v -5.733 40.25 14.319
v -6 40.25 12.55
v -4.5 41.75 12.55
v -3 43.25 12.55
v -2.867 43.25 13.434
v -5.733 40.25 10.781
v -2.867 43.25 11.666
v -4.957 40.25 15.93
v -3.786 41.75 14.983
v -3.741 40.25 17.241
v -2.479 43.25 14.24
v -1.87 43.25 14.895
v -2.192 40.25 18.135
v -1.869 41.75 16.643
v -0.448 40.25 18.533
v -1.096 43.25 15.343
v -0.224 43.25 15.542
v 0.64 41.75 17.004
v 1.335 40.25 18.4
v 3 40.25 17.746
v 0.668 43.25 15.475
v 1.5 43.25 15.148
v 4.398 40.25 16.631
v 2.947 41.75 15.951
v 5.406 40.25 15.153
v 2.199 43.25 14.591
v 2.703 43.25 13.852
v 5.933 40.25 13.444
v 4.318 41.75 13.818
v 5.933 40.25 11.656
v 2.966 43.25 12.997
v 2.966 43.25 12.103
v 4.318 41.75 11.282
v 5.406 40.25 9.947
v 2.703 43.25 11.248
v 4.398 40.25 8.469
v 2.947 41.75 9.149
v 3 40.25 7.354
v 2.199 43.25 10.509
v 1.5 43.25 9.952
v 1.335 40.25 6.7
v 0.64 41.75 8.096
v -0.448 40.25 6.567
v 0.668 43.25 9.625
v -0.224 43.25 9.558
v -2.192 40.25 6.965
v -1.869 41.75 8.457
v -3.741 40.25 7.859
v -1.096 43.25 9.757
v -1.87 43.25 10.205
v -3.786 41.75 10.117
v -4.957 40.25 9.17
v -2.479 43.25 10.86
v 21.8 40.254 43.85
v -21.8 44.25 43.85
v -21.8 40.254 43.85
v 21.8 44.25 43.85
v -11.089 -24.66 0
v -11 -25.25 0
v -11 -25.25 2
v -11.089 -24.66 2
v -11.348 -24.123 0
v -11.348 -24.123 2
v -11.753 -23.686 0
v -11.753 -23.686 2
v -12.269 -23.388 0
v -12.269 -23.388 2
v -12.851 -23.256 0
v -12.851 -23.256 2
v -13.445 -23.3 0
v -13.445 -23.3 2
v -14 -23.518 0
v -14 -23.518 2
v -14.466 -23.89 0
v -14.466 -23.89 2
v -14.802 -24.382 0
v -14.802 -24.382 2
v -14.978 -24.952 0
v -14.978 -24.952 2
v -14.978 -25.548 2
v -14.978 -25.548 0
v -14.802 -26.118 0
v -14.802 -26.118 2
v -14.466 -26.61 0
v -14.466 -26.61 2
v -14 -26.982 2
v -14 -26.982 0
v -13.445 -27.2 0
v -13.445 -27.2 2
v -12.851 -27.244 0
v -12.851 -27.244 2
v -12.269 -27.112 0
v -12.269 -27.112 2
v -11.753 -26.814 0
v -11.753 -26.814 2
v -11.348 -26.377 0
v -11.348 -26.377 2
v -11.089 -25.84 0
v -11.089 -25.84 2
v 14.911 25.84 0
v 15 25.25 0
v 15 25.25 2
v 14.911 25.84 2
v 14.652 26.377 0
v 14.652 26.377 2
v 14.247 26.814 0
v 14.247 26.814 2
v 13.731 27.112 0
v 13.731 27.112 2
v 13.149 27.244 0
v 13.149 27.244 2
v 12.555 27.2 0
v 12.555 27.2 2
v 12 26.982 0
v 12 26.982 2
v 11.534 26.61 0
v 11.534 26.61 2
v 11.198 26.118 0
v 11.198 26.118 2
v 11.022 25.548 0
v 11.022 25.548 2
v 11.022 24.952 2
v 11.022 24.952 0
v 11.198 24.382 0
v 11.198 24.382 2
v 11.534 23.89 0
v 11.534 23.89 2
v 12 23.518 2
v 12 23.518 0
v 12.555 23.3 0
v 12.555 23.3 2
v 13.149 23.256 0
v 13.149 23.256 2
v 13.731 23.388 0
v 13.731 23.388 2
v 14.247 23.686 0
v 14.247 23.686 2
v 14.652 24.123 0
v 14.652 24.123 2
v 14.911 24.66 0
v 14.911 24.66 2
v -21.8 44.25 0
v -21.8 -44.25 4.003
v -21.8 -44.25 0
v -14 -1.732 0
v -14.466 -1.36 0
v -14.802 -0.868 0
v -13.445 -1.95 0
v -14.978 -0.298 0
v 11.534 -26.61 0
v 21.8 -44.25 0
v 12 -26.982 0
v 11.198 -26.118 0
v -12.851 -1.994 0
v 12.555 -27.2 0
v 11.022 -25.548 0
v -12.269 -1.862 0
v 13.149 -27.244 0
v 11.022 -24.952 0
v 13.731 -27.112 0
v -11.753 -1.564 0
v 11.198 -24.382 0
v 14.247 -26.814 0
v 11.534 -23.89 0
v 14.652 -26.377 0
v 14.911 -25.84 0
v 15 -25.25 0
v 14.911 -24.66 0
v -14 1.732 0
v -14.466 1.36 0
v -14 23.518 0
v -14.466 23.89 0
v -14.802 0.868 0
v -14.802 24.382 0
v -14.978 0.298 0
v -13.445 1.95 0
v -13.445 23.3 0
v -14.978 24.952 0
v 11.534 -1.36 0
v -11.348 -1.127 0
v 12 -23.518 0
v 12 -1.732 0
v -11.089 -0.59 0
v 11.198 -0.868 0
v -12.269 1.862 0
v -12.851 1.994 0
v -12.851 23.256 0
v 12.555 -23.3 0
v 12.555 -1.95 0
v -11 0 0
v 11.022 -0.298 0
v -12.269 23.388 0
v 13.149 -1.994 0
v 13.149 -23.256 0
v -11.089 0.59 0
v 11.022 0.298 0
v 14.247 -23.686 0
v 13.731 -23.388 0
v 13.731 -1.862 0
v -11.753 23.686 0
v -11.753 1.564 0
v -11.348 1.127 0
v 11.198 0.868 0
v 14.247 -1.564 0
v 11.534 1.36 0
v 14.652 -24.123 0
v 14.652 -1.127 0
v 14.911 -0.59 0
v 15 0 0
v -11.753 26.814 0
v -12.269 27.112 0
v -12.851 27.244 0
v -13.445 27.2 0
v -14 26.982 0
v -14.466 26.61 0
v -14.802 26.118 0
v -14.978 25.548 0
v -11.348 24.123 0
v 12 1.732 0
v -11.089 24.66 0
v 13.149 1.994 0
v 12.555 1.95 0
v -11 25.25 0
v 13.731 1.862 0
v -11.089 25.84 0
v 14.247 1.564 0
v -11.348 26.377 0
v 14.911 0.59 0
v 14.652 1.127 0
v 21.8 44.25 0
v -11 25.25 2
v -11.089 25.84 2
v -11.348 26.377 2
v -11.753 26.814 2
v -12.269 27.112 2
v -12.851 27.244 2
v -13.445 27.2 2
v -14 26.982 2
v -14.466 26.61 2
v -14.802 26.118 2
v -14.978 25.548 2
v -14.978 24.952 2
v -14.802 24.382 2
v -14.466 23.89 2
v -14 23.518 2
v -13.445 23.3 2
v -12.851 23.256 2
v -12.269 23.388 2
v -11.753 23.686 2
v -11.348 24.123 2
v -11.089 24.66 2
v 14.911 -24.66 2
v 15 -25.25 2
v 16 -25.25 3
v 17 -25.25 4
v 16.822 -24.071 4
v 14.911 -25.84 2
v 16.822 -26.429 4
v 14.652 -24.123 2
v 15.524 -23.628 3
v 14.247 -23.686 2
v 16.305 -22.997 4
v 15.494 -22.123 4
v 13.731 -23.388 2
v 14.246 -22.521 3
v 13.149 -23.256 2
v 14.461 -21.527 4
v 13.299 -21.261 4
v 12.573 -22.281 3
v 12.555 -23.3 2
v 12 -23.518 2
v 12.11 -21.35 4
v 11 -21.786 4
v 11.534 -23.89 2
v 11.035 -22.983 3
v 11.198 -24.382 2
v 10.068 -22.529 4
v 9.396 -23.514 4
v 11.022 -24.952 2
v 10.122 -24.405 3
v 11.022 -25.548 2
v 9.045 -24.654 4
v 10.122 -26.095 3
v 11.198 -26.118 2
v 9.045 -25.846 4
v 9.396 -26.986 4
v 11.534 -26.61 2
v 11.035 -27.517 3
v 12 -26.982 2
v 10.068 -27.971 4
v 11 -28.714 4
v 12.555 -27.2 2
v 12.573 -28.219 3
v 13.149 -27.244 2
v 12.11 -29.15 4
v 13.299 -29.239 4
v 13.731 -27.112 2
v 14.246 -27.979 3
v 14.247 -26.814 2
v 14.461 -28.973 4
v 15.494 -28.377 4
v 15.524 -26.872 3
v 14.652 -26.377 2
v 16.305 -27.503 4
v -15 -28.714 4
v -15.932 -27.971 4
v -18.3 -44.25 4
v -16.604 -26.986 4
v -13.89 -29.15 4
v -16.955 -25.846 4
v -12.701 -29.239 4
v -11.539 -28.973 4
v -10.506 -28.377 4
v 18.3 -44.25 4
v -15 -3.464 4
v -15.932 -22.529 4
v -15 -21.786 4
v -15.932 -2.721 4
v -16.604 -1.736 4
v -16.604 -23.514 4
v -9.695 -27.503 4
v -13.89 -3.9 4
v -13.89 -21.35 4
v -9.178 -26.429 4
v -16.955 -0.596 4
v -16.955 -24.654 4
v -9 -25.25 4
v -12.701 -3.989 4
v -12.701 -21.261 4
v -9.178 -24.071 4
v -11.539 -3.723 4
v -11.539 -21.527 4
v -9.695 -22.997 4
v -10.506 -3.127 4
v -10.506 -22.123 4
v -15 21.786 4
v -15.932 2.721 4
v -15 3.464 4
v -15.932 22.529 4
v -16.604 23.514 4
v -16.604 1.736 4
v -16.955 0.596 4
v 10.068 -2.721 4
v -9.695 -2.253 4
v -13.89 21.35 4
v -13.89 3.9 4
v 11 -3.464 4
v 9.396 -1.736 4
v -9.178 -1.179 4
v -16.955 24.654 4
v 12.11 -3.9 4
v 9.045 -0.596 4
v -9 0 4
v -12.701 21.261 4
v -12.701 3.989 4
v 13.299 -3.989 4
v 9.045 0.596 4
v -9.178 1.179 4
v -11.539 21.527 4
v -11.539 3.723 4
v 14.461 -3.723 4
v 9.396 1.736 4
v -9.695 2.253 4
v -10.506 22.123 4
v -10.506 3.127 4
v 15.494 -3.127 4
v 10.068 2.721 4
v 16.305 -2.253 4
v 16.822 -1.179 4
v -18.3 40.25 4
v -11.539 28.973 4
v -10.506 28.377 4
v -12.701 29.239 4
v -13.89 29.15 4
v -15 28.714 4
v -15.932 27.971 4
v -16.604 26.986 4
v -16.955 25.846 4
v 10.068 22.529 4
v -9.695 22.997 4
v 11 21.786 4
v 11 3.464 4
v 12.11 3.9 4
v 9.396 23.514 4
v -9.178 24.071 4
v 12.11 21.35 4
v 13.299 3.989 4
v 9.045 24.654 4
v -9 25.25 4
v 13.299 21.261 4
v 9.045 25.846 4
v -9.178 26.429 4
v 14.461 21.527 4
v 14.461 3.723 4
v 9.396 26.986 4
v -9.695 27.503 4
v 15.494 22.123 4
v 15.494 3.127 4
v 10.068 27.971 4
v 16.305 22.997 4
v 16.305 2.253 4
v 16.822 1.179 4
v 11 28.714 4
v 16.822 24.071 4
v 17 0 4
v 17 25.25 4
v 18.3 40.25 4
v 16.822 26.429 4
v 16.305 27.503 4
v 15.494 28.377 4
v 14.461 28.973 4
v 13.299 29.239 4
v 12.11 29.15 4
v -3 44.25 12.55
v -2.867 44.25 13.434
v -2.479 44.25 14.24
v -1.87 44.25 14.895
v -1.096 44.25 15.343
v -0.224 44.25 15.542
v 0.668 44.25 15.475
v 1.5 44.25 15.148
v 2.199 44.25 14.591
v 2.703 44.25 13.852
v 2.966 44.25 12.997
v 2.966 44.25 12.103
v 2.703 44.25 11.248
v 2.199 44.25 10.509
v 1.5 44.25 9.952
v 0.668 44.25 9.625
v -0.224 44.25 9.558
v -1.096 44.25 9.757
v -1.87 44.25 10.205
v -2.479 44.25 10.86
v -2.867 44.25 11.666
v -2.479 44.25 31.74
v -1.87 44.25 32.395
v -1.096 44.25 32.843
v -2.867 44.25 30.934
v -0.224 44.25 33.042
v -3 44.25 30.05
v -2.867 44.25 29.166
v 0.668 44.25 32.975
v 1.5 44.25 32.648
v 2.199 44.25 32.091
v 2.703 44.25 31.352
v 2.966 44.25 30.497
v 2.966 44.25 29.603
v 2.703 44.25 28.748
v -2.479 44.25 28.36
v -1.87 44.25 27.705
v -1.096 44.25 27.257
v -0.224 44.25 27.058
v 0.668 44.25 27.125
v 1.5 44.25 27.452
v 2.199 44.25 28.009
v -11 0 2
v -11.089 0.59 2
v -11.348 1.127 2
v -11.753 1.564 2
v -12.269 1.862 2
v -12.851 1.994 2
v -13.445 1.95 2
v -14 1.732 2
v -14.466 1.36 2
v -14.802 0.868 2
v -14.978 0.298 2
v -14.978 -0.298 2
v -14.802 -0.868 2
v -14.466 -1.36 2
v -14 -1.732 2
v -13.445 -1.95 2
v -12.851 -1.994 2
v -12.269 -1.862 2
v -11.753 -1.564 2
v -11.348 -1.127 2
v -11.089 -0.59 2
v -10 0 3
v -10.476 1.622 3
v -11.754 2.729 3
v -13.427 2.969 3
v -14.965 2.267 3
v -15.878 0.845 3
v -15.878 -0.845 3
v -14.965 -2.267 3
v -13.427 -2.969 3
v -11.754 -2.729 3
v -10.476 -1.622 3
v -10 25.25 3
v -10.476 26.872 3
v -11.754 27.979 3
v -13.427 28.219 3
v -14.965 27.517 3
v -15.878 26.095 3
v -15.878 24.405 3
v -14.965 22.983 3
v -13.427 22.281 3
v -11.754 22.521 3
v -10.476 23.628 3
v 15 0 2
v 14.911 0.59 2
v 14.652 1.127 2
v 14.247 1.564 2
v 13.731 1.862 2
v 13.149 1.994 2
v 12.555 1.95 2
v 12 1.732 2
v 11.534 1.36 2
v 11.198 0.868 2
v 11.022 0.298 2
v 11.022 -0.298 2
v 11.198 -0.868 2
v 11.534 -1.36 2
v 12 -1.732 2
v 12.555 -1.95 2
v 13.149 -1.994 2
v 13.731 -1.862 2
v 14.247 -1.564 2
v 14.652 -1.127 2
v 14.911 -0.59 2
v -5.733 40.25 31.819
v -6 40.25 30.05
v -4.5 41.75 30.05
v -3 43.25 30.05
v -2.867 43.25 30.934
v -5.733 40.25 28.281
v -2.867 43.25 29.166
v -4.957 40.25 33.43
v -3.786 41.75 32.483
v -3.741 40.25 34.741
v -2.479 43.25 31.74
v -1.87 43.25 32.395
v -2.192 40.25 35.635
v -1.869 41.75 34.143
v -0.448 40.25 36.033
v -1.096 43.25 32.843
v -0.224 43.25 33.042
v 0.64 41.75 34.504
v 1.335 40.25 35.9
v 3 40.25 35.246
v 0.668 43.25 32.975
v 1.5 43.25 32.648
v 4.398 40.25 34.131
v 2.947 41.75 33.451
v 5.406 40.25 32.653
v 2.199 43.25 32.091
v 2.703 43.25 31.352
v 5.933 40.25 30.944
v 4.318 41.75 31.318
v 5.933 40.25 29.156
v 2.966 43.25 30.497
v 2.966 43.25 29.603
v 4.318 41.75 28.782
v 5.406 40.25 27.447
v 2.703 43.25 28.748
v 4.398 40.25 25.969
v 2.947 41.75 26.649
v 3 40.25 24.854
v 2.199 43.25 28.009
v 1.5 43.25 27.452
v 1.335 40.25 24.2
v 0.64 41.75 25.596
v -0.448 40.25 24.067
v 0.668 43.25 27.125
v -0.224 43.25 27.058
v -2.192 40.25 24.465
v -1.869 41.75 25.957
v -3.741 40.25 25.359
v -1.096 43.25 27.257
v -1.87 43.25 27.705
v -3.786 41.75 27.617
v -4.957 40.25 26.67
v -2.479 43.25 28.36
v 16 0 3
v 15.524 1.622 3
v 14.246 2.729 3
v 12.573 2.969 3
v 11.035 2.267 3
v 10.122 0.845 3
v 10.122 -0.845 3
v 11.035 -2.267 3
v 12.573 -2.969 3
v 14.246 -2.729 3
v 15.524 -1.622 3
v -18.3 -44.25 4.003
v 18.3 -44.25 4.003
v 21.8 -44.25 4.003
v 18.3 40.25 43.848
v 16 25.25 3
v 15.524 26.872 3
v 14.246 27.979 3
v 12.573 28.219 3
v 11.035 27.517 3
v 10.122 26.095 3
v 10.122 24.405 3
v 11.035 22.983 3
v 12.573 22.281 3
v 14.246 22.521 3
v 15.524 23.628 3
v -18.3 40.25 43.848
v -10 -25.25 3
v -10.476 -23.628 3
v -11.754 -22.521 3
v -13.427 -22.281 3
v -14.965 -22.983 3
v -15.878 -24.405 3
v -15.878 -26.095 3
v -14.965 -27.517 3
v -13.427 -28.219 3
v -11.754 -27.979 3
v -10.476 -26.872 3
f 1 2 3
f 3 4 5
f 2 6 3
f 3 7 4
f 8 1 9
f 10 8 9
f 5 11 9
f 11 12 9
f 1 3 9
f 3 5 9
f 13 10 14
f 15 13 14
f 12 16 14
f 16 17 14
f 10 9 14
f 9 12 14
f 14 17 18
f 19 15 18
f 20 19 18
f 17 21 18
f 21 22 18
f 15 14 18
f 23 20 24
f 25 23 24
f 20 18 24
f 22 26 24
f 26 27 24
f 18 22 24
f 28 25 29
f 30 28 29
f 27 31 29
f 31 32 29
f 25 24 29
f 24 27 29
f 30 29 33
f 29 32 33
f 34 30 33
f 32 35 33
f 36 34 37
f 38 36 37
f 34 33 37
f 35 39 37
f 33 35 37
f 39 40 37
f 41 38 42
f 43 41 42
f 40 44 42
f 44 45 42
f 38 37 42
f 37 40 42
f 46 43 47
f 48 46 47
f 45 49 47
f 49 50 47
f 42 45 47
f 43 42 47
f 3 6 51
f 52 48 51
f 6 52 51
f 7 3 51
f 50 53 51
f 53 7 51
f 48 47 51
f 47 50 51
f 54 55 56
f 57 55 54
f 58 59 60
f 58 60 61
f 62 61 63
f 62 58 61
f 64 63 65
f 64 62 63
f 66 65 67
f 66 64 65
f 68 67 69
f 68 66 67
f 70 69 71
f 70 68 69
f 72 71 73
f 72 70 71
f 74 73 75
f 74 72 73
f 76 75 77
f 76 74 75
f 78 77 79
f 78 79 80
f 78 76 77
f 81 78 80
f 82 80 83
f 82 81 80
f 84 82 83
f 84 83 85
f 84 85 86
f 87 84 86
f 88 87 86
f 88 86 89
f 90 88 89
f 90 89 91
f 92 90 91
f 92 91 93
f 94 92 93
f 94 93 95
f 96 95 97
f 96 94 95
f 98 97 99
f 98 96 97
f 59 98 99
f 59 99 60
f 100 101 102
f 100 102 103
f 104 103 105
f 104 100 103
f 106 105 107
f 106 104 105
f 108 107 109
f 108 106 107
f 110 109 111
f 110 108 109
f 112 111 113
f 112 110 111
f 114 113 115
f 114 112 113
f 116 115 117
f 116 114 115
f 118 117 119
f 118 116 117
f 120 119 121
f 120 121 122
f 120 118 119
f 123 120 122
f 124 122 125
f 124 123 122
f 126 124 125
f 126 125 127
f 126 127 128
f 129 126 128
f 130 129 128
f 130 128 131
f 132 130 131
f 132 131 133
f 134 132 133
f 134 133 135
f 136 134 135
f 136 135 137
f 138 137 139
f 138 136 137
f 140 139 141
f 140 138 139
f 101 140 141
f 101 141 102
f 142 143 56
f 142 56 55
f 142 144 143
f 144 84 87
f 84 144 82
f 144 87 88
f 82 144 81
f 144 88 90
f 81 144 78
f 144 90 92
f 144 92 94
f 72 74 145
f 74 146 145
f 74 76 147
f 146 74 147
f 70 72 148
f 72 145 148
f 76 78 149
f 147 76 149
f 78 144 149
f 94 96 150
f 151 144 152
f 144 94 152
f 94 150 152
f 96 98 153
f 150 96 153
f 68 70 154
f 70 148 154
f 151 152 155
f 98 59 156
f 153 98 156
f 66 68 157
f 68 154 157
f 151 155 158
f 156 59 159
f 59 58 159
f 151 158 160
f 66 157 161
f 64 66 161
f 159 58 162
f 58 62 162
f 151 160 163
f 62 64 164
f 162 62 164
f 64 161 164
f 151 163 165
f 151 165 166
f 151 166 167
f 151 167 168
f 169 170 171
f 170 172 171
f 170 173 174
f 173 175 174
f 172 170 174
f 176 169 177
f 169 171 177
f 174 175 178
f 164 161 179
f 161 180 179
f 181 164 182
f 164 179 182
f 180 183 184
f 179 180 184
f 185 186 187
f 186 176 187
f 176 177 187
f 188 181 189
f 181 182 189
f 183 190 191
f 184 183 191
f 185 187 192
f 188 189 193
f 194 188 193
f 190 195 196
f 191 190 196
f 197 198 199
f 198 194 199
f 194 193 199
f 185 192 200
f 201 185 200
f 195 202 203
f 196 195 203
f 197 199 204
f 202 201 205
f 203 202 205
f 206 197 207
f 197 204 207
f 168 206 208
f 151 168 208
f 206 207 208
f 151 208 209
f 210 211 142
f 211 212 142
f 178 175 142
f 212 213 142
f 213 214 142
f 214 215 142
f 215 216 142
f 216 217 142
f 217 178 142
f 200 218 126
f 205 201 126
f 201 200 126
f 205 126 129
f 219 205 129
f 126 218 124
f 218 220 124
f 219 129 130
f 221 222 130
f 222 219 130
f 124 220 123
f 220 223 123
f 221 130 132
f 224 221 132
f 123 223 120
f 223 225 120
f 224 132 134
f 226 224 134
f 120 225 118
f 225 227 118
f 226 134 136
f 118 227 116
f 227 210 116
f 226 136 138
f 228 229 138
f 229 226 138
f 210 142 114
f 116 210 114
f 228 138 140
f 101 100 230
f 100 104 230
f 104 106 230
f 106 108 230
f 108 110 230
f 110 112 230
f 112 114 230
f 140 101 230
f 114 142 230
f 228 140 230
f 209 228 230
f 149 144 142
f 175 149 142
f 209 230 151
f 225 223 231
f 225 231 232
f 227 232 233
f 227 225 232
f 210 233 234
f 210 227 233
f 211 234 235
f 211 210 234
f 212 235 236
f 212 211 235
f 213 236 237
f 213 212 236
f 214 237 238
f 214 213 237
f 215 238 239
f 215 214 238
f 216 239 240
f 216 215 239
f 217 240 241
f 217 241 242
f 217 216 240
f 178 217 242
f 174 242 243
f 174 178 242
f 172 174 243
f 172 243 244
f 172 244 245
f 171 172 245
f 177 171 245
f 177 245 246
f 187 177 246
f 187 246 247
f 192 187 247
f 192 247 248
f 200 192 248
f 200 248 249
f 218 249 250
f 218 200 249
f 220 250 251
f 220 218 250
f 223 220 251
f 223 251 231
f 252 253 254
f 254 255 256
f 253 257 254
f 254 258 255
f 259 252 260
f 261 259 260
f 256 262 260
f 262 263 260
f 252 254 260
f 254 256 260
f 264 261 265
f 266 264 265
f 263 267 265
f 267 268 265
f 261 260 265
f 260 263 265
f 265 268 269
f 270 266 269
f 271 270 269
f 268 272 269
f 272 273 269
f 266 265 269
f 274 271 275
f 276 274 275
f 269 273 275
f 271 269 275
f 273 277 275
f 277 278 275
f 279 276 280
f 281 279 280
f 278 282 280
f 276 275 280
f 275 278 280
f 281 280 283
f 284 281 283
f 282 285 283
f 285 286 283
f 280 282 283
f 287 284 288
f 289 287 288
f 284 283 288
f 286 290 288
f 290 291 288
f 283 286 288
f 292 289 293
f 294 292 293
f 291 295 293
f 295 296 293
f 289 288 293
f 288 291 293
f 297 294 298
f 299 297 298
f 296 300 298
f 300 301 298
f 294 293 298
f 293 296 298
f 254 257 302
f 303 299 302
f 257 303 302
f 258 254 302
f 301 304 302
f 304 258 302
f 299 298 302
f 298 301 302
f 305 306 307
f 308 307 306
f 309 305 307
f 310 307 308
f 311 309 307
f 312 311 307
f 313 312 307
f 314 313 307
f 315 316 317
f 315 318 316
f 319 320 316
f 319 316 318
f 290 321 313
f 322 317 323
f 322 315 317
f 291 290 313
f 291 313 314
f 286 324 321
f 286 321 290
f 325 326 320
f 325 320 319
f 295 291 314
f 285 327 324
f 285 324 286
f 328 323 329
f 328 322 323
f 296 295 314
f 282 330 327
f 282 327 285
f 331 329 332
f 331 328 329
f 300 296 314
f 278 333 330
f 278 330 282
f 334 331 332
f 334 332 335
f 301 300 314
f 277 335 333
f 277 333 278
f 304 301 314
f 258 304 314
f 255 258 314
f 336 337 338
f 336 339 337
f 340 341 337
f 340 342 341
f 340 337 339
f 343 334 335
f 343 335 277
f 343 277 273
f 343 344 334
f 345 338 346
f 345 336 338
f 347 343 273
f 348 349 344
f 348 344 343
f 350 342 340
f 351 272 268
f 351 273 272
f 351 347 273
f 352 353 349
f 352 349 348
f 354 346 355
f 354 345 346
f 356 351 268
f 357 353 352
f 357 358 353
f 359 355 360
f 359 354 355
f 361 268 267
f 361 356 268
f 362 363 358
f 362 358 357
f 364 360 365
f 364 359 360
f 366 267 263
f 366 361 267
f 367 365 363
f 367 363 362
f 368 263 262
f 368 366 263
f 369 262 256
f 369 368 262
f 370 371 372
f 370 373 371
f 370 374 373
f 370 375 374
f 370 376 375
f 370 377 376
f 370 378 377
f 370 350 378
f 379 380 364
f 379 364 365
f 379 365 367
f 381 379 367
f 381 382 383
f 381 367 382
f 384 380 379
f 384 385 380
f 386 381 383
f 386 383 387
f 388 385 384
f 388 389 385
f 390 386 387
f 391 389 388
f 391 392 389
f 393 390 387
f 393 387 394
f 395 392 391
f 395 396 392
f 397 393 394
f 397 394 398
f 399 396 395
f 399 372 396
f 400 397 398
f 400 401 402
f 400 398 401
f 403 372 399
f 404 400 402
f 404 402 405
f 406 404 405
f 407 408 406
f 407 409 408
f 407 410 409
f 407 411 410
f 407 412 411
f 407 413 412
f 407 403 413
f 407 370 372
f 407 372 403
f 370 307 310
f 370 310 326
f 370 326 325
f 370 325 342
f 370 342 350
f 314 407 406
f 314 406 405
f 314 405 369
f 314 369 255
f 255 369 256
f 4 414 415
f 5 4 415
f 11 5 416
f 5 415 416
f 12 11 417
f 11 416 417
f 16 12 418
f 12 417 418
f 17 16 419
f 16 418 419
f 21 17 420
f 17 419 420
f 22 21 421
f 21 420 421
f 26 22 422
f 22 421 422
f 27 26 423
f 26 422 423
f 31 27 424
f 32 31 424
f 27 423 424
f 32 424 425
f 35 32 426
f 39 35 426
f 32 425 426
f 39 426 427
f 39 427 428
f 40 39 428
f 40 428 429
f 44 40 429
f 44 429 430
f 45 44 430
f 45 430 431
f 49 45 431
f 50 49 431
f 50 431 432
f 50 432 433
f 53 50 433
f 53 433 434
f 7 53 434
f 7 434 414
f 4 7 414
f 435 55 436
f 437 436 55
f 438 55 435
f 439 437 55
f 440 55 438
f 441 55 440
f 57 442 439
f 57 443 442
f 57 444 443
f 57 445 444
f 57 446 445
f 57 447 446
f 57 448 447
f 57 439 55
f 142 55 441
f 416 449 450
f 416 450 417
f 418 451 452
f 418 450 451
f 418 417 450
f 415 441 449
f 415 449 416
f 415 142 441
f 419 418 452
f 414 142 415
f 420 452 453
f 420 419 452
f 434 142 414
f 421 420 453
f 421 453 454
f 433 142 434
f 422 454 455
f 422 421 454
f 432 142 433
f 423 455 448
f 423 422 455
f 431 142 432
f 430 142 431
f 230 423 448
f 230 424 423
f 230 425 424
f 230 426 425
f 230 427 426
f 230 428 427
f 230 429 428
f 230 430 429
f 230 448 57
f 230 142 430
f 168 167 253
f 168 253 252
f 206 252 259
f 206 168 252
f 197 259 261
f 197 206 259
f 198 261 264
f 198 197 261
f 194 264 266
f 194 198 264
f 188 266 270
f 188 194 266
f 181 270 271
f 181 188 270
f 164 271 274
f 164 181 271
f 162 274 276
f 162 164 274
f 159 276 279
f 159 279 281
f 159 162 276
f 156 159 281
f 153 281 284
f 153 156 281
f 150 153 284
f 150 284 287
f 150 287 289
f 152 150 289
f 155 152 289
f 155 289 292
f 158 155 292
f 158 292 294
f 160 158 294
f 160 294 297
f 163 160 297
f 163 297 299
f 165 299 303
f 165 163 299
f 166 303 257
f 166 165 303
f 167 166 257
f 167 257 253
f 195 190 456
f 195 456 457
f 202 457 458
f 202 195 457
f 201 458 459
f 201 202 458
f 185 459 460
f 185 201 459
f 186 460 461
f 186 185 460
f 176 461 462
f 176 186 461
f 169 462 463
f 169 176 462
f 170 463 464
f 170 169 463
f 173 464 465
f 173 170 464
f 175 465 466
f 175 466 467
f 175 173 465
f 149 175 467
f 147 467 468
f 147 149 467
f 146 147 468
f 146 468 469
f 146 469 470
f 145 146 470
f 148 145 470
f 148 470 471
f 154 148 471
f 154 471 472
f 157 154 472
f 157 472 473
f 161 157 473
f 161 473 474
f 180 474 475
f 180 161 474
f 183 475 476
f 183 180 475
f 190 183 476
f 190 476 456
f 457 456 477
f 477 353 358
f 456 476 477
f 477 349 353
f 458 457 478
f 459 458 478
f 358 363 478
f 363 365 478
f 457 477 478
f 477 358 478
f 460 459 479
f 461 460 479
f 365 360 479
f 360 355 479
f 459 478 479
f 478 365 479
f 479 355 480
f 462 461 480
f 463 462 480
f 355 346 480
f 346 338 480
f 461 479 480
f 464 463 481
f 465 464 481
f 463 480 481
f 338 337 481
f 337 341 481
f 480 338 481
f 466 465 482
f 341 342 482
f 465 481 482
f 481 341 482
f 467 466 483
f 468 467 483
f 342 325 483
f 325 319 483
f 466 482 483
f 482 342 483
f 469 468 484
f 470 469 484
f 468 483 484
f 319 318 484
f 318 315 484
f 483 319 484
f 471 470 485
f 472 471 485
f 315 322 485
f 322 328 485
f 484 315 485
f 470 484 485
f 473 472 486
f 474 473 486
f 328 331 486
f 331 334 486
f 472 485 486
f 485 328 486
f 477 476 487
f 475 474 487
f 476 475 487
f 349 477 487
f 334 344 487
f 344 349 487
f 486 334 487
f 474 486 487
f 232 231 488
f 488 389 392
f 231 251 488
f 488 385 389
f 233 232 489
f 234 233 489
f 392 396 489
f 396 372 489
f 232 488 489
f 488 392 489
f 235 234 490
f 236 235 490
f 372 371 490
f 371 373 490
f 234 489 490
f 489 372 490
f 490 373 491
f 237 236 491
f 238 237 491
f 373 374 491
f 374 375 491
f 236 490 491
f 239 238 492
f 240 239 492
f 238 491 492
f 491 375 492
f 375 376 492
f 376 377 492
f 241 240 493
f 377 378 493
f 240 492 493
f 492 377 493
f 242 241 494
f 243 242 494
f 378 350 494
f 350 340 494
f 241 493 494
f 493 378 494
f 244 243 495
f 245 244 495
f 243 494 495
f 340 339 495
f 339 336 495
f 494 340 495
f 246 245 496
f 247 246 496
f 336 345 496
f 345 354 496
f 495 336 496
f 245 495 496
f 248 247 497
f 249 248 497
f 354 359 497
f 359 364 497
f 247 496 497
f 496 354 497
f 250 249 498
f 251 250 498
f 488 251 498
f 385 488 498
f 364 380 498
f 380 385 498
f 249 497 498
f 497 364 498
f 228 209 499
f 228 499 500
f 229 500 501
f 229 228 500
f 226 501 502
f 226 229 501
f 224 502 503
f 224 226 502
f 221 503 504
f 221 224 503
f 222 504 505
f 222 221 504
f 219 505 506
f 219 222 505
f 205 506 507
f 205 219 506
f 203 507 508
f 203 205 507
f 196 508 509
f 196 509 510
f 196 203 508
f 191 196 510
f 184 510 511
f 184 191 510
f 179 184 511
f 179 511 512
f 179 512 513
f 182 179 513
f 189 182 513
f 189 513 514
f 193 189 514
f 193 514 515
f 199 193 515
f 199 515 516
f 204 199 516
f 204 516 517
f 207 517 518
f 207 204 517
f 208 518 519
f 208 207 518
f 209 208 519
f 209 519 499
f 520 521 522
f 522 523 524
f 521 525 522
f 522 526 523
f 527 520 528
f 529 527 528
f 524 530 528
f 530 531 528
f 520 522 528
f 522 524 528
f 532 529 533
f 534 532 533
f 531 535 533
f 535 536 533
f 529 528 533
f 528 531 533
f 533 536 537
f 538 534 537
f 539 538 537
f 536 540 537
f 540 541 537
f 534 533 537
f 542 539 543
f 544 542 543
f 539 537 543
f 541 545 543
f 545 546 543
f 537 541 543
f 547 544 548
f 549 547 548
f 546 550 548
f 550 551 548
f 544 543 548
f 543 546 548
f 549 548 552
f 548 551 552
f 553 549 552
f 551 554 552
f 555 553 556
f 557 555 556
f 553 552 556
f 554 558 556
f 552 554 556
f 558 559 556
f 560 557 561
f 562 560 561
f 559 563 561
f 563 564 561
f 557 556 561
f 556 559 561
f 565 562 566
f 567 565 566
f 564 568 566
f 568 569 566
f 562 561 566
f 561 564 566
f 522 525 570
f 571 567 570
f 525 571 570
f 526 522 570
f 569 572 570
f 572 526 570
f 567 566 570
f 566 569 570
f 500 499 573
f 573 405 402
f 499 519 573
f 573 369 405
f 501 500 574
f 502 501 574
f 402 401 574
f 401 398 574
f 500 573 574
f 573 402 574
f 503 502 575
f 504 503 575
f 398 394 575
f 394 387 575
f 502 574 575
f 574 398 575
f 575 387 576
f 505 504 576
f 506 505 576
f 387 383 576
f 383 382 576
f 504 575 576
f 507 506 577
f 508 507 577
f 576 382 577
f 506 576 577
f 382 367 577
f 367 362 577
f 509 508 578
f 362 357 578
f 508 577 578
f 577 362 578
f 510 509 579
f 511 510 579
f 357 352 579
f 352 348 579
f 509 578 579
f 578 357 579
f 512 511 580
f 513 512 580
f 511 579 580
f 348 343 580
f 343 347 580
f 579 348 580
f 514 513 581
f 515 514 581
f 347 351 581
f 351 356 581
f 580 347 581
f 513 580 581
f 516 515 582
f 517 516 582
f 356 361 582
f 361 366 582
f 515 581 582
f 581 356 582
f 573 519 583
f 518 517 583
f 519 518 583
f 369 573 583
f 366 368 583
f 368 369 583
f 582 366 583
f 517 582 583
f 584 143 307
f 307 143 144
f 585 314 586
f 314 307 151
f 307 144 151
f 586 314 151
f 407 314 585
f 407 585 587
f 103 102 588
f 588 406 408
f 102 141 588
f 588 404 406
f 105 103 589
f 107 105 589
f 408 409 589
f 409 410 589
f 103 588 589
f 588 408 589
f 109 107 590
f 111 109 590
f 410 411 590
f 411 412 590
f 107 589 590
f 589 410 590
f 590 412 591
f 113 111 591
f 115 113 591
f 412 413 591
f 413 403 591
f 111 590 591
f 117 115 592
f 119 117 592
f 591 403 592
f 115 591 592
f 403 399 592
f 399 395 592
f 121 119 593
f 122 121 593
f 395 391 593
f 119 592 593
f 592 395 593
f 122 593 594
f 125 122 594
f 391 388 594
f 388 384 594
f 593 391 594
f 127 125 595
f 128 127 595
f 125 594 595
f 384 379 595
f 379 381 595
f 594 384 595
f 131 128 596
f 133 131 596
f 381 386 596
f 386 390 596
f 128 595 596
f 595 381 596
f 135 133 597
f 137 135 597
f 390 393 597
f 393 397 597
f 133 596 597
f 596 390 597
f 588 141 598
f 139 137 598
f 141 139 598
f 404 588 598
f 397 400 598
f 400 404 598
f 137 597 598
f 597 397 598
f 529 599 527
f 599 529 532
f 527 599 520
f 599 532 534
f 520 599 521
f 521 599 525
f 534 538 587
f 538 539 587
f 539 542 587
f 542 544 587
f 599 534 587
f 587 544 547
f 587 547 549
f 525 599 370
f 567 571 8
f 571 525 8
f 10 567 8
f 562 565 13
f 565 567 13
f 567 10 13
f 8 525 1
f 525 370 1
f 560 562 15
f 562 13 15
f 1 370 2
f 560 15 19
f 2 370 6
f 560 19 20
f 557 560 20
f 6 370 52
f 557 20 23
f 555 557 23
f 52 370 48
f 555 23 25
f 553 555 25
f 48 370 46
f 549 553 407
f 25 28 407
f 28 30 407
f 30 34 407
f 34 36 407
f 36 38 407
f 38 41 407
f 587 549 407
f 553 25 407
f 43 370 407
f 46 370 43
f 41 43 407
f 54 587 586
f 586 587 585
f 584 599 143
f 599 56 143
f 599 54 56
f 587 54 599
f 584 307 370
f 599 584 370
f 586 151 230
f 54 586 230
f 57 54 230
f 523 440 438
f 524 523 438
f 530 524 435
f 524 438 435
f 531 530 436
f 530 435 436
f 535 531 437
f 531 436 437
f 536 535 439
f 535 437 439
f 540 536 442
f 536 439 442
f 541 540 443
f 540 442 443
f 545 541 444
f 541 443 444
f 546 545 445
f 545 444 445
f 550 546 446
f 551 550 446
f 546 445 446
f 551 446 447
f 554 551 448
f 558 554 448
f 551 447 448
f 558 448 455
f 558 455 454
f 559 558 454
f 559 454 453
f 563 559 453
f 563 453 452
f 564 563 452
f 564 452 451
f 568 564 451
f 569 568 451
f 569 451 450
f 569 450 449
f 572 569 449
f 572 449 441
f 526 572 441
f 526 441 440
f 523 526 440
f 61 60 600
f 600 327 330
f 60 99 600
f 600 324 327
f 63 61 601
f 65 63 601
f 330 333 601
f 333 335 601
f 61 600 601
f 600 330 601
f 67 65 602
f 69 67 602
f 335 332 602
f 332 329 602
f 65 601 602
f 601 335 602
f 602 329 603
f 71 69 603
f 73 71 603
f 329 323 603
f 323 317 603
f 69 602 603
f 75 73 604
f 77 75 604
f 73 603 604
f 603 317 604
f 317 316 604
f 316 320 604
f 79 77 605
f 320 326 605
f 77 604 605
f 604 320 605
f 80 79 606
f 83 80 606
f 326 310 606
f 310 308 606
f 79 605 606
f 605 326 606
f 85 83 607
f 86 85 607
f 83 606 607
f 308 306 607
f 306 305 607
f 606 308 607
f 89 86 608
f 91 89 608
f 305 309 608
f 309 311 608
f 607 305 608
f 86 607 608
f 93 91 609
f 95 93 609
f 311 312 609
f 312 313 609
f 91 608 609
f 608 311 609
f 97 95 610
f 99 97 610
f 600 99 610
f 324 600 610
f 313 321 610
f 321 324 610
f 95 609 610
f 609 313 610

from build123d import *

# Parameters (mm, degrees)
SKETCH_W        = 43.6
SKETCH_H        = 88.5
SKETCH_R        = 2
PAD_DEPTH       = 4
CHAMFER_SIZE    = 2
SKETCH001_W     = 43.6
SKETCH001_H     = 4
PAD001_DEPTH    = 39.85
SKETCH002_R     = 3
HOLE_DEPTH      = 25
HOLE_TIPS_R     = 3
CHAMFER001_SIZE = 3
SKETCH003_W     = 3.5
SKETCH003_H     = 88.5
PAD002_DEPTH    = 39.85
POCKET_DEPTH    = 43.601


with BuildPart() as part:
    # Sketch → Pad (new body)
    with BuildSketch(Plane.XY):
        Rectangle(SKETCH_W, SKETCH_H)
        with Locations((-13, 0)):
            Circle(SKETCH_R, mode=Mode.SUBTRACT)
        with Locations((13, 0)):
            Circle(SKETCH_R, mode=Mode.SUBTRACT)
        with Locations((-13, 25.25)):
            Circle(SKETCH_R, mode=Mode.SUBTRACT)
        with Locations((13, 25.25)):
            Circle(SKETCH_R, mode=Mode.SUBTRACT)
        with Locations((-13, -25.25)):
            Circle(SKETCH_R, mode=Mode.SUBTRACT)
        with Locations((13, -25.25)):
            Circle(SKETCH_R, mode=Mode.SUBTRACT)
    extrude(amount=PAD_DEPTH)

    # Chamfer
    chamfer_edges = [part.edges().sort_by_distance(p)[0] for p in [
        (-15, -25.25, 4),
        (-15, 0, 4),
        (-15, 25.25, 4),
        (11, 25.25, 4),
        (11, 0, 4),
        (11, -25.25, 4),
    ]]
    chamfer(chamfer_edges, length=CHAMFER_SIZE)

    # Sketch001 (on Face4 of Chamfer) → Pad001 (join)
    with BuildSketch(Plane.XY.offset(4)):
        with Locations((0, 42.25)):
            Rectangle(SKETCH001_W, SKETCH001_H)
    extrude(amount=PAD001_DEPTH)

    # Sketch002 (on Face20 of Pad001) → Hole (cut)
    with BuildSketch(Plane(origin=(0, 44.25, 0), x_dir=(-1, 0, 0), z_dir=(0, 1, 0))):
        with Locations((0, 12.55)):
            Circle(SKETCH002_R)
        with Locations((0, 30.05)):
            Circle(SKETCH002_R)
    extrude(amount=-HOLE_DEPTH, mode=Mode.SUBTRACT)

    # Hole tips → Hole tip 1 section 0
    with BuildSketch(Plane(origin=(0, 19.25, 0), x_dir=(-1, 0, 0), z_dir=(0, 1, 0)), mode=Mode.PRIVATE) as hole_tip_1_s0:
        with Locations((0, 12.55)):
            Circle(HOLE_TIPS_R)
    loft([hole_tip_1_s0.sketch, Vertex(0, 17.447418, 12.55)], mode=Mode.SUBTRACT)

    # Hole tips → Hole tip 2 section 0
    with BuildSketch(Plane(origin=(0, 19.25, 0), x_dir=(-1, 0, 0), z_dir=(0, 1, 0)), mode=Mode.PRIVATE) as hole_tip_2_s0:
        with Locations((0, 30.05)):
            Circle(HOLE_TIPS_R)
    loft([hole_tip_2_s0.sketch, Vertex(0, 17.447418, 30.05)], mode=Mode.SUBTRACT)

    # Chamfer001
    chamfer001_edges = [part.edges().sort_by_distance(p)[0] for p in [
        (-3, 40.25, 30.05),
        (-3, 40.25, 12.55),
    ]]
    chamfer(chamfer001_edges, length=CHAMFER001_SIZE)

    # Sketch003 (on Face4 of Chamfer001) → Pad002 (join)
    with BuildSketch(Plane.XY.offset(4)):
        with Locations((-20.05, 0)):
            Rectangle(SKETCH003_W, SKETCH003_H)
        with Locations((20.05, 0)):
            Rectangle(SKETCH003_W, SKETCH003_H)
    extrude(amount=PAD002_DEPTH)

    # Sketch004 (on Face12 of Pad002) → Pocket (cut, through all)
    with BuildSketch(Plane(origin=(-21.8, 0, 0), x_dir=(0, -1, 0), z_dir=(-1, 0, 0))):
        Polygon((-40.254917, 43.850445), (44.398479, 3.93337), (49.801365, 49.127281), (-36.76268, 49.127281), align=None)
    extrude(amount=-POCKET_DEPTH, mode=Mode.SUBTRACT)


solid = part.part
